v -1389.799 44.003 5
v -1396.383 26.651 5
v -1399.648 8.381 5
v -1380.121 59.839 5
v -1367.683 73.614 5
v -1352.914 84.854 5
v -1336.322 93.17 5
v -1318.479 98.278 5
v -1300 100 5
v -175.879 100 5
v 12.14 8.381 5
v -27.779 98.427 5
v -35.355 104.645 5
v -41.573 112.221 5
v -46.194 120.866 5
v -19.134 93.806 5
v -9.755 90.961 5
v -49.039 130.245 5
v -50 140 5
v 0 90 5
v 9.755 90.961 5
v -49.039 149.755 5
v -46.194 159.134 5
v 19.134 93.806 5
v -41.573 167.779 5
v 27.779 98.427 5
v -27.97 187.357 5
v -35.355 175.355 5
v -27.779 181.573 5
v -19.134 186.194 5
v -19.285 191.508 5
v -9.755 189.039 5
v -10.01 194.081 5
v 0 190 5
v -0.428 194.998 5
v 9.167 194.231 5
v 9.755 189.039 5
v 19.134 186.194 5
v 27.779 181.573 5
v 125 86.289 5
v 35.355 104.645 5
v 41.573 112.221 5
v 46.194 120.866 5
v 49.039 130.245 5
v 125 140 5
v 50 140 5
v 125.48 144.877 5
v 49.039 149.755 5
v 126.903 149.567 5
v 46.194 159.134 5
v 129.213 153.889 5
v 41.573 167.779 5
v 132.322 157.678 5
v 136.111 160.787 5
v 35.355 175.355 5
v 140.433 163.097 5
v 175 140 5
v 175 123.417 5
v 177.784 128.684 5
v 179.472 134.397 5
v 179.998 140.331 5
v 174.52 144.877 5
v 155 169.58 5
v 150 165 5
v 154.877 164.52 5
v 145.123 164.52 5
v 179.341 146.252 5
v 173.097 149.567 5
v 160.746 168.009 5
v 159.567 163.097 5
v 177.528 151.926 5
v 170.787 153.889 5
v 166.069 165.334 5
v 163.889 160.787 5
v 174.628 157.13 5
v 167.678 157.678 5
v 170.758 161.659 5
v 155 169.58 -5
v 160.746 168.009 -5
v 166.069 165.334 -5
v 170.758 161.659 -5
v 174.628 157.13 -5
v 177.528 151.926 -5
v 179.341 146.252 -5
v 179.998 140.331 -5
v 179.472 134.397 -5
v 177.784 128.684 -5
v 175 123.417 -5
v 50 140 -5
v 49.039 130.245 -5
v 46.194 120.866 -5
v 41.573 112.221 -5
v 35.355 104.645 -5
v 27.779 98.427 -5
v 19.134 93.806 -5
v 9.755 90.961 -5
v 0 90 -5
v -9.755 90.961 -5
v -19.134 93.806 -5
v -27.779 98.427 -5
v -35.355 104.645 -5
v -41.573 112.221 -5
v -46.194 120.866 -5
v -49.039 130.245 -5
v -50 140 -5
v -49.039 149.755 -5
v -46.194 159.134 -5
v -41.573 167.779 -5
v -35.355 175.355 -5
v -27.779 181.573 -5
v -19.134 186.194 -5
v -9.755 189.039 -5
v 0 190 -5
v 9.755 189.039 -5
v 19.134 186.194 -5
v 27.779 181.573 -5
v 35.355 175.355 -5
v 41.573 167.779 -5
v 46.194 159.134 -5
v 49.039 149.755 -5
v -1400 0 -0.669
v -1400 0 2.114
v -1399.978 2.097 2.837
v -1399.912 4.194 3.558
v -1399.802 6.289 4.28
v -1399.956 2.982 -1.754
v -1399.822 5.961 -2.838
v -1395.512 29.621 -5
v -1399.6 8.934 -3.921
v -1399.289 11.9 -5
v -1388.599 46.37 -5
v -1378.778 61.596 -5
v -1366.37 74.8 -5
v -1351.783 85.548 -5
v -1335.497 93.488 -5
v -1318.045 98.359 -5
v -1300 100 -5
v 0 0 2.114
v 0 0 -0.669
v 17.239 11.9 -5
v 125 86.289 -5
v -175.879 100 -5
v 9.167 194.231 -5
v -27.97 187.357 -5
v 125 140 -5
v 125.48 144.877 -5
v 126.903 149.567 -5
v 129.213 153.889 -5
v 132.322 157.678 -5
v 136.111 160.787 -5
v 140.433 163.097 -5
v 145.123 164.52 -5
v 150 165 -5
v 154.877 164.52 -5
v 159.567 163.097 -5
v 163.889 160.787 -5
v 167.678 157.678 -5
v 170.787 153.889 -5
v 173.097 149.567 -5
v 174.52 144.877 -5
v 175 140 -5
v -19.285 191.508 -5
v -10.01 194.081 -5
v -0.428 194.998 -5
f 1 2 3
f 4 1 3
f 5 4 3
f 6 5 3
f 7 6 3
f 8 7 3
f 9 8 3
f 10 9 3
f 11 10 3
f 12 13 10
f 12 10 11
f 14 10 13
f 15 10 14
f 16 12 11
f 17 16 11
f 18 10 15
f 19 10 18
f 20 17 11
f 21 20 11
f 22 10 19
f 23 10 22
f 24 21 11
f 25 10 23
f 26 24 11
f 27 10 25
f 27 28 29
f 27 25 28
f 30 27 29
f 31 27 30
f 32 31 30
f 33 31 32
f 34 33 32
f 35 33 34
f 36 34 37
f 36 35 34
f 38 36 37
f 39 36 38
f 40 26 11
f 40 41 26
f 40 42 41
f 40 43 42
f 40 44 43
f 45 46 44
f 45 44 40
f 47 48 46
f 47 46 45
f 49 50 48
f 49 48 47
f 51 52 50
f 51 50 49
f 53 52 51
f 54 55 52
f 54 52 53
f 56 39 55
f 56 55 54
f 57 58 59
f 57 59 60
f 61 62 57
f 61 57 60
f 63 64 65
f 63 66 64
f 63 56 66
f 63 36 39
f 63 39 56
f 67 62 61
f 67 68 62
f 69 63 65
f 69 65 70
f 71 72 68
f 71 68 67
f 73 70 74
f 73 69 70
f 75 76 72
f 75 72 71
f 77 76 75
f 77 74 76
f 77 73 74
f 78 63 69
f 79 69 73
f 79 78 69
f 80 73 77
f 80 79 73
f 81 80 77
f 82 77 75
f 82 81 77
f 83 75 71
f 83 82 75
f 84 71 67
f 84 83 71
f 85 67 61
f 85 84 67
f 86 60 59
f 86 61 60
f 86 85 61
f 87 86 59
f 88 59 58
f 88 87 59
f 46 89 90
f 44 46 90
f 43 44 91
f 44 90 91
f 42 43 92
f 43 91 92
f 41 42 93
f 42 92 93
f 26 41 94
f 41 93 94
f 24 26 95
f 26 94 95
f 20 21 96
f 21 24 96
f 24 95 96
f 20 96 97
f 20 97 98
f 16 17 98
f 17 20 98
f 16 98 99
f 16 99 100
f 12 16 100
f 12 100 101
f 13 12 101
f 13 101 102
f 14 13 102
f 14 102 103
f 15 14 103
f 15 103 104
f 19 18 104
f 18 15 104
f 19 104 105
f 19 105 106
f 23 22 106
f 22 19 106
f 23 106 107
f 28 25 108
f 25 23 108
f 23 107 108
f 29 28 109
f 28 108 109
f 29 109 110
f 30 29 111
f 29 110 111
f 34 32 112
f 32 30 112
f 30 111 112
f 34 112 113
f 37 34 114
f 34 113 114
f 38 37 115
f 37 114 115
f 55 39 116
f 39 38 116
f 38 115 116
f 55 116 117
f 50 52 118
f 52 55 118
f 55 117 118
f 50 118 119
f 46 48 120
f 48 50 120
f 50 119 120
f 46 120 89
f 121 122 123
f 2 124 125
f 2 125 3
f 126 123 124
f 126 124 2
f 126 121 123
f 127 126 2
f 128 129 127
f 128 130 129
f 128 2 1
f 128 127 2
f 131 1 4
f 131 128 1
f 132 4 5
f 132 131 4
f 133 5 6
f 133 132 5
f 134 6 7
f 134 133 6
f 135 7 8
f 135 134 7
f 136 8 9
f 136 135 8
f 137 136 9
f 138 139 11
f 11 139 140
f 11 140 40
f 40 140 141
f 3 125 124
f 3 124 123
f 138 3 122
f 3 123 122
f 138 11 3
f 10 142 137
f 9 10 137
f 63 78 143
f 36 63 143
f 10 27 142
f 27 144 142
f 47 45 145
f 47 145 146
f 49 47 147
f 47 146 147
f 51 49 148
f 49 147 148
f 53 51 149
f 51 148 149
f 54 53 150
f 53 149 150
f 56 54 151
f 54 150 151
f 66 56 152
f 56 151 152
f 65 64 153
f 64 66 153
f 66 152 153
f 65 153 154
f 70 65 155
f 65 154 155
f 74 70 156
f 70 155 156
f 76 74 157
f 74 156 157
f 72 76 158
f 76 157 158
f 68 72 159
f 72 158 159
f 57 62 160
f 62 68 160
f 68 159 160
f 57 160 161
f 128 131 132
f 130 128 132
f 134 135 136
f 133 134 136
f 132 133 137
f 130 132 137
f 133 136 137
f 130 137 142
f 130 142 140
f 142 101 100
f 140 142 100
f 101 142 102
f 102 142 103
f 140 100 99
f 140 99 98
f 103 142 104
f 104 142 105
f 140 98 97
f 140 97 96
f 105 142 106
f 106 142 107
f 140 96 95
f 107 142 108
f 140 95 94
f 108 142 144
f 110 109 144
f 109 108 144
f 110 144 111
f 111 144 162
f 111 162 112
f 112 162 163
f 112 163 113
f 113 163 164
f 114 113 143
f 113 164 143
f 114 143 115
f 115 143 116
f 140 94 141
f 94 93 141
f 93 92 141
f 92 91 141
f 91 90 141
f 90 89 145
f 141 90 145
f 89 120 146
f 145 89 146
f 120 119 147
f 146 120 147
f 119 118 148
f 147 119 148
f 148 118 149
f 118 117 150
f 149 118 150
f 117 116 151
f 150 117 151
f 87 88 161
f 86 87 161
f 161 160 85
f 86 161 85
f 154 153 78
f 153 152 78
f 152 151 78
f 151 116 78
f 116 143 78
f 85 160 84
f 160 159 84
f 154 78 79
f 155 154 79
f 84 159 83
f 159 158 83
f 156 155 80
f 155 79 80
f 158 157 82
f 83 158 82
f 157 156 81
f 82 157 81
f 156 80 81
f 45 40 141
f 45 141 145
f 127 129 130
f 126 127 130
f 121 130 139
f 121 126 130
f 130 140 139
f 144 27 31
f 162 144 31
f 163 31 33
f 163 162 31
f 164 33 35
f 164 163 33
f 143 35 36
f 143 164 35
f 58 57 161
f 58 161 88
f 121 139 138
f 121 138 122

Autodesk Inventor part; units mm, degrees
ref_plane "YZ Plane" through (0, 0, 0) normal (1, 0, 0) x (0, 1, 0)
ref_plane "XZ Plane" through (0, 0, 0) normal (0, 1, 0) x (-1, 0, 0)
ref_plane "XY Plane" through (0, 0, 0) normal (0, 0, 1) x (1, 0, 0)
sketch "Boceto4" plane through (0, 0, 0) normal (0, 0, 1) x (1, 0, 0)
  circle A0 centre (0, 140) radius 50
  circle A1 centre (150, 140) radius 25
  arc A2 (167.0429, 115.3112) -> (155, 169.5804) centre (150, 140) ccw
  arc A3 (9.1667, 194.2307) -> (-27.9698, 187.3571) centre (0, 140) ccw
  line L0 (155, 169.5804) -> (9.1667, 194.2307)
  line L1 (0, 0) -> (167.0429, 115.3112)
  line L2 (0, 0) -> (-1400, 0)
  line L3 (-27.9698, 187.3571) -> (-175.8786, 100)
  line L4 (-175.8786, 100) -> (-1300, 100)
  arc A4 (-1300, 100) -> (-1400, 0) centre (-1300, 0) ccw
  dimension "d24" = 100
  dimension "d25" = 50
  dimension "d26" = 150
  dimension "d27" = 5
  dimension "d28" = 5
  dimension "d29" = 140
  dimension "d30" = 1400
  dimension "d32" = 100
  dimension "d33" = 171.7797
extrude "Extrusión3" add sketch "Boceto4" along normal mid plane 10
sketch "Boceto5" plane through (0, 0, 0) normal (1, 0, 0) x (0, 1, 0)
  line L0 (12, -5.0363) -> (-1, -0.3047)
  line L1 (-1, -0.3047) -> (-1, -5.0363)
  line L2 (-1, -5.0363) -> (12, -5.0363)
  line L3 (12, 6.2463) -> (-1, 1.77)
  line L4 (-1, 1.77) -> (-1, 6.2463)
  line L5 (-1, 6.2463) -> (12, 6.2463)
  point P0 (0, 0)
  dimension "d36" = 1
  dimension "d37" = 13
  dimension "d38" = 13
  dimension "d39" = 70
  dimension "d40" = 71
  dimension "d41" = 0.3047
  dimension "d42" = 1.77
extrude "Extrusión4" cut sketch "Boceto5" along normal through all both and the other way through all
sketch "Boceto6" plane through (0, 0, 5) normal (0, 0, 1) x (1, 0, 0)
  circle A0 centre (150, 140) radius 25 construction
  line L0 (125, 140) -> (175, 140)
  line L1 (175, 140) -> (175, 83.3252)
  line L2 (175, 83.3252) -> (125, 83.3252)
  line L3 (125, 83.3252) -> (125, 140)
  point P0 (0, 0)
  dimension "d46" = 50
  dimension "d47" = 0
  dimension "d50" = 56.6748
extrude "Extrusión5" cut sketch "Boceto6" against normal through all
properties part number "hoja de filo"
